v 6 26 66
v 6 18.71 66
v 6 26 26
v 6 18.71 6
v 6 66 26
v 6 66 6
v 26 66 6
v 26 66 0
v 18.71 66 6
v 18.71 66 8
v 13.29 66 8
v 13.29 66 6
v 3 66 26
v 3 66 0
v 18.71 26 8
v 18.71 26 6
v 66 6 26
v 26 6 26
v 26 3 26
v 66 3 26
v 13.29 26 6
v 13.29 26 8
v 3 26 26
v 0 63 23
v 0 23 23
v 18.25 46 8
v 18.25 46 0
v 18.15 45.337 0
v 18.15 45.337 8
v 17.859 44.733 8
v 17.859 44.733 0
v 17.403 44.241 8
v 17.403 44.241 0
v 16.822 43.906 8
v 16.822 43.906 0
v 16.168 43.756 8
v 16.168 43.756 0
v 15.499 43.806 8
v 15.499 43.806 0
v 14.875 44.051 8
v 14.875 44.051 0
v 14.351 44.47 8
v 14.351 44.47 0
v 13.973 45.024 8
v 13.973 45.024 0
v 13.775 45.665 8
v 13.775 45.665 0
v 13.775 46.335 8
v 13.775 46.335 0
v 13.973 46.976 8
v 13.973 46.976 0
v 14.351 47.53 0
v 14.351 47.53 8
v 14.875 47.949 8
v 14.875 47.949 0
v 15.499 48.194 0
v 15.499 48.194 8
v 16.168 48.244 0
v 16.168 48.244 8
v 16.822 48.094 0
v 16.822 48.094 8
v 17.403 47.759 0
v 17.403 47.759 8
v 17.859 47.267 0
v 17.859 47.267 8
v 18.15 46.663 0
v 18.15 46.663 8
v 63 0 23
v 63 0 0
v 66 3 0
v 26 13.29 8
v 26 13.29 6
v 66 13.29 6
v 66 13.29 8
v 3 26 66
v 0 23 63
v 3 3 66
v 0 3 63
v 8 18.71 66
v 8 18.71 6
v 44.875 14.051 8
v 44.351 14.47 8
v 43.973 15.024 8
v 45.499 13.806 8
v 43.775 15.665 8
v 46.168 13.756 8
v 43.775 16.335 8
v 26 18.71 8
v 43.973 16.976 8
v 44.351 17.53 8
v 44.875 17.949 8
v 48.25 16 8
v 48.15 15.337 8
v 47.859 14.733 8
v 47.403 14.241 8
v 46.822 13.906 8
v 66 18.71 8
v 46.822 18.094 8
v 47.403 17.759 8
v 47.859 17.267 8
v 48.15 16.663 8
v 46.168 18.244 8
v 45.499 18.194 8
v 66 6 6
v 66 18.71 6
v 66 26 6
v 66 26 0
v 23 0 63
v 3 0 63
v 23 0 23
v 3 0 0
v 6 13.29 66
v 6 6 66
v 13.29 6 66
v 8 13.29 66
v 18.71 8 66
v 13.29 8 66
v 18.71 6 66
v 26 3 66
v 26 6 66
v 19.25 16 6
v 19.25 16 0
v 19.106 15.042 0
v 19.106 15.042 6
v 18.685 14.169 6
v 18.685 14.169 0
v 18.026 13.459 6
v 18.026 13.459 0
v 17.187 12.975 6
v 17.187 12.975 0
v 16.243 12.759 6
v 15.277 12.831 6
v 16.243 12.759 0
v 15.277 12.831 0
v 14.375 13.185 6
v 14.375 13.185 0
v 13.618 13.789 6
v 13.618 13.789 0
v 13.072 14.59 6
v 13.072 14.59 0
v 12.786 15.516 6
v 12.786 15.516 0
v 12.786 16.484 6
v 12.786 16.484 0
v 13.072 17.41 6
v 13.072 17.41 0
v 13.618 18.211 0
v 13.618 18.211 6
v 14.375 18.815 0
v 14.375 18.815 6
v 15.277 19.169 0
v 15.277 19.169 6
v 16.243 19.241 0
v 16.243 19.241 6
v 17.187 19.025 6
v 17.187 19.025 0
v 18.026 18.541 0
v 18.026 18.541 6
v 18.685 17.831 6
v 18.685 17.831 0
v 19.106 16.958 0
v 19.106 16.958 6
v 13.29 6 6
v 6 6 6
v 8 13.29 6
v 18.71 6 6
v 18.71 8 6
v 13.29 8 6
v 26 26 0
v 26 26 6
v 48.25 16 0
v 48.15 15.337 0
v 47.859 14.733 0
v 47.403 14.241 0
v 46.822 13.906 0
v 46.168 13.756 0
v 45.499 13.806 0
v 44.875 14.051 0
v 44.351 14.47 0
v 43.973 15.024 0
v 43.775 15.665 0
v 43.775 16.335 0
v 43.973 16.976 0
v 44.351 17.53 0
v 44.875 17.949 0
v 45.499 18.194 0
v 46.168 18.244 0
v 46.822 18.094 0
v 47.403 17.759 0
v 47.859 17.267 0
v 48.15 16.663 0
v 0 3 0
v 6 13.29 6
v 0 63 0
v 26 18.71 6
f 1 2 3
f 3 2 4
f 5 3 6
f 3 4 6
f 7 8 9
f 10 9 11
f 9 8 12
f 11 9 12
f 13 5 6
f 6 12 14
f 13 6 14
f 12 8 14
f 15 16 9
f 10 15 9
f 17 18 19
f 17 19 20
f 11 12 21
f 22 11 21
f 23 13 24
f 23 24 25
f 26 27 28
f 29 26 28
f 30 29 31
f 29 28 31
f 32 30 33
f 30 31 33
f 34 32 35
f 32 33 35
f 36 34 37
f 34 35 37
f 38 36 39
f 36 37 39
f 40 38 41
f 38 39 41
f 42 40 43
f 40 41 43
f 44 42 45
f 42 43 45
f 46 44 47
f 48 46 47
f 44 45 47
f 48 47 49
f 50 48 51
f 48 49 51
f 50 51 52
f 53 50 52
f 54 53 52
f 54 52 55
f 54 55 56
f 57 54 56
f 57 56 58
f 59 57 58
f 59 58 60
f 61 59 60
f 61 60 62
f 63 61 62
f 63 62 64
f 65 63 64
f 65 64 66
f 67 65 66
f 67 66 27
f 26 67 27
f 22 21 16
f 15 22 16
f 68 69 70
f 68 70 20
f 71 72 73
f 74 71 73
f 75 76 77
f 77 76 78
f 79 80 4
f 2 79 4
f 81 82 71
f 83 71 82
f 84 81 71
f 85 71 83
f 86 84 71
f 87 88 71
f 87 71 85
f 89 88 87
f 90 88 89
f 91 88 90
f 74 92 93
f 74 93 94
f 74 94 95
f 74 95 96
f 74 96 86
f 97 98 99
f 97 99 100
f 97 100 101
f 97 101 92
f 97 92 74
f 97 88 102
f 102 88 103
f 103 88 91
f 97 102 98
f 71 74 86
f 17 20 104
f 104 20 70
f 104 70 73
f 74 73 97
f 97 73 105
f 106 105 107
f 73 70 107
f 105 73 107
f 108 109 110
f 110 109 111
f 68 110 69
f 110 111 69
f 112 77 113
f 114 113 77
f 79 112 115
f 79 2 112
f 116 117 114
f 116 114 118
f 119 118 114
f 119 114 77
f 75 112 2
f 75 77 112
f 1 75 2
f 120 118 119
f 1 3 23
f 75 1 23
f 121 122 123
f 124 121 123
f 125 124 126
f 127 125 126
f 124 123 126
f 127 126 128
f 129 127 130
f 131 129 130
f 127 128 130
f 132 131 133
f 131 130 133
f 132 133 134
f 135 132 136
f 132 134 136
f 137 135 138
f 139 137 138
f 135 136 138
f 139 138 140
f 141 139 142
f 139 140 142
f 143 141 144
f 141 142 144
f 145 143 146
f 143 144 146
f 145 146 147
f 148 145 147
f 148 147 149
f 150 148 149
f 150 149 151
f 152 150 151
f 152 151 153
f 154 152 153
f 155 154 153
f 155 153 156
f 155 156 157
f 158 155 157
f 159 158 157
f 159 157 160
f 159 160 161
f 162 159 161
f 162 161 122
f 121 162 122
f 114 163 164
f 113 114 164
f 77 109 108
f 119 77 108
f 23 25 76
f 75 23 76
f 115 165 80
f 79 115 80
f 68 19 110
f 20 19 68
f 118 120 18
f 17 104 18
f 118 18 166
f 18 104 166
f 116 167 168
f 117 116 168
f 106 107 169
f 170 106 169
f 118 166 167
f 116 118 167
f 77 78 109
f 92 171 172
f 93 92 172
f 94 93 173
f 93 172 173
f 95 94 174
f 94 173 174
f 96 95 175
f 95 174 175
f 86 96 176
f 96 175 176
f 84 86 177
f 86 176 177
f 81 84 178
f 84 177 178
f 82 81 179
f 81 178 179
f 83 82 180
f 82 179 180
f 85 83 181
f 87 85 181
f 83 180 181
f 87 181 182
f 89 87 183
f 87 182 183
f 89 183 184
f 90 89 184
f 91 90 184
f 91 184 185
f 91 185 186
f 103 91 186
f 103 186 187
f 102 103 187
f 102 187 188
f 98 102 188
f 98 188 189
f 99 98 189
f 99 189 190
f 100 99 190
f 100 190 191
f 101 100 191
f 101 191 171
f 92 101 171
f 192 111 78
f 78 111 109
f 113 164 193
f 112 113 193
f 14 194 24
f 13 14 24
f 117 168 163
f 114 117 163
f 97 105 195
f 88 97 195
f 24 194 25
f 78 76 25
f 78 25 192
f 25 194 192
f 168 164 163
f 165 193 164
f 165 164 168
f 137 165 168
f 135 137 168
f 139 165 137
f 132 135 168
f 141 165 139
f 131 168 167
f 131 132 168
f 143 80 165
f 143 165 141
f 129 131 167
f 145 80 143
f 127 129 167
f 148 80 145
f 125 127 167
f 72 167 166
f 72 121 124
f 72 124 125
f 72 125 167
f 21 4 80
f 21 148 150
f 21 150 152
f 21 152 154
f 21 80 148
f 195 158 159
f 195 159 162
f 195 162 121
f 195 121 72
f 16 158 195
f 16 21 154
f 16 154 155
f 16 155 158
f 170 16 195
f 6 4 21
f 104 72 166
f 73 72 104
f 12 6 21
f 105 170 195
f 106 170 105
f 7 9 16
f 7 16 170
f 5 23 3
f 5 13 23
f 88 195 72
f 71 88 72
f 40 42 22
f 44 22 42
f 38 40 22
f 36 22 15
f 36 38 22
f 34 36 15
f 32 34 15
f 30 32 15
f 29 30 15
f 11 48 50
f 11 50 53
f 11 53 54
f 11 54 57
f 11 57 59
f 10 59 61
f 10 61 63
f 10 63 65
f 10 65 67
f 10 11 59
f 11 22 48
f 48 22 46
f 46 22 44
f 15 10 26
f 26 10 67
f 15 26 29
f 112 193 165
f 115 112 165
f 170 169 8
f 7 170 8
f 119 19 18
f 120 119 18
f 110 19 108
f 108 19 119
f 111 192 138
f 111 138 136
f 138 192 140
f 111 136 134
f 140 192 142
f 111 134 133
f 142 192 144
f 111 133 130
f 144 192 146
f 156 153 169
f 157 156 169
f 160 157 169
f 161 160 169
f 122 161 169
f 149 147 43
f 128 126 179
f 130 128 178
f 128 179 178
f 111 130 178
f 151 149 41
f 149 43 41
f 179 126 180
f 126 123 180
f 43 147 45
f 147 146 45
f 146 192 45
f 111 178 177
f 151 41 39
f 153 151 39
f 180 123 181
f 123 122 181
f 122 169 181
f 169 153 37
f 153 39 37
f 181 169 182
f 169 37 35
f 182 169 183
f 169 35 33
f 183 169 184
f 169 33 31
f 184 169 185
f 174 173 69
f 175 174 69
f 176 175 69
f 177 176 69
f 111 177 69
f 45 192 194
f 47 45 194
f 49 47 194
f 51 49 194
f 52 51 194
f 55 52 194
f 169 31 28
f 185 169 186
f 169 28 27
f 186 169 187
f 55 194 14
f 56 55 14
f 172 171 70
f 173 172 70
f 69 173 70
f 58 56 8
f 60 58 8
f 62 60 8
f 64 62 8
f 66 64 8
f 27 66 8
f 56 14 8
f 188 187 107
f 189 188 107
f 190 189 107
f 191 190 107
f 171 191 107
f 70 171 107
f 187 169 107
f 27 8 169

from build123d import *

# Parameters (mm, degrees)
F1_DEPTH  = 6
F3_DEPTH  = 20
F5_DEPTH  = 40
F7_DEPTH  = 60
F9_DEPTH  = 2
F12_R     = 3.25
F12_R_2   = 2.25
F13_DEPTH = 8.001
F14_SIZE  = 3


with BuildPart() as f1:
    # F0 (on Top) → F1 (new body)
    with BuildSketch(Plane.XY):
        Polygon((0, 66), (0, 0), (66, 0), (66, 26), (26, 26), (26, 66), align=None)
    extrude(amount=F1_DEPTH)

    # F2 (on face) → F3 (join)
    with BuildSketch(Plane.XY.offset(6)):
        Polygon((6, 66), (0, 66), (0, 0), (66, 0), (66, 6), (6, 6), align=None)
    extrude(amount=F3_DEPTH)

    # F4 (on face) → F5 (join)
    with BuildSketch(Plane.XY.offset(26)):
        Polygon((6, 6), (6, 26), (0, 26), (0, 0), (26, 0), (26, 6), align=None)
    extrude(amount=F5_DEPTH)

    # F6 (on face) → F7 (join)
    with BuildSketch(Plane.XY.offset(6)):
        Polygon((13.29, 6), (16, 6), (18.71, 6), (18.71, 8), (13.29, 8), align=None)
        Polygon((6, 18.71), (6, 16), (6, 13.29), (8, 13.29), (8, 18.71), align=None)
    extrude(amount=F7_DEPTH)

    # F8 (on face) → F9 (join)
    with BuildSketch(Plane.XY.offset(6)):
        Polygon((66, 13.29), (66, 16), (66, 18.71), (26, 18.71), (26, 13.29), align=None)
        Polygon((18.71, 66), (16, 66), (13.29, 66), (13.29, 26), (18.71, 26), align=None)
    extrude(amount=F9_DEPTH)

    # F12 (on face) → F13 (cut, through all)
    with BuildSketch(Plane(origin=(0, 0, 0), x_dir=(1, 0, 0), z_dir=(0, 0, -1))):
        with Locations((16, -16)):
            Circle(F12_R)
        with Locations((46, -16)):
            Circle(F12_R_2)
        with Locations((16, -46)):
            Circle(F12_R_2)
    extrude(amount=-F13_DEPTH, mode=Mode.SUBTRACT)

    # F14
    f14_edges = [f1.edges().sort_by_distance(p)[0] for p in [
        (0, 0, 33),
        (0, 26, 46),
        (0, 46, 26),
        (26, 0, 46),
        (46, 0, 26),
        (0, 13, 66),
        (13, 0, 66),
        (0, 66, 13),
        (66, 0, 13),
    ]]
    chamfer(f14_edges, length=F14_SIZE)


solid = f1.part
